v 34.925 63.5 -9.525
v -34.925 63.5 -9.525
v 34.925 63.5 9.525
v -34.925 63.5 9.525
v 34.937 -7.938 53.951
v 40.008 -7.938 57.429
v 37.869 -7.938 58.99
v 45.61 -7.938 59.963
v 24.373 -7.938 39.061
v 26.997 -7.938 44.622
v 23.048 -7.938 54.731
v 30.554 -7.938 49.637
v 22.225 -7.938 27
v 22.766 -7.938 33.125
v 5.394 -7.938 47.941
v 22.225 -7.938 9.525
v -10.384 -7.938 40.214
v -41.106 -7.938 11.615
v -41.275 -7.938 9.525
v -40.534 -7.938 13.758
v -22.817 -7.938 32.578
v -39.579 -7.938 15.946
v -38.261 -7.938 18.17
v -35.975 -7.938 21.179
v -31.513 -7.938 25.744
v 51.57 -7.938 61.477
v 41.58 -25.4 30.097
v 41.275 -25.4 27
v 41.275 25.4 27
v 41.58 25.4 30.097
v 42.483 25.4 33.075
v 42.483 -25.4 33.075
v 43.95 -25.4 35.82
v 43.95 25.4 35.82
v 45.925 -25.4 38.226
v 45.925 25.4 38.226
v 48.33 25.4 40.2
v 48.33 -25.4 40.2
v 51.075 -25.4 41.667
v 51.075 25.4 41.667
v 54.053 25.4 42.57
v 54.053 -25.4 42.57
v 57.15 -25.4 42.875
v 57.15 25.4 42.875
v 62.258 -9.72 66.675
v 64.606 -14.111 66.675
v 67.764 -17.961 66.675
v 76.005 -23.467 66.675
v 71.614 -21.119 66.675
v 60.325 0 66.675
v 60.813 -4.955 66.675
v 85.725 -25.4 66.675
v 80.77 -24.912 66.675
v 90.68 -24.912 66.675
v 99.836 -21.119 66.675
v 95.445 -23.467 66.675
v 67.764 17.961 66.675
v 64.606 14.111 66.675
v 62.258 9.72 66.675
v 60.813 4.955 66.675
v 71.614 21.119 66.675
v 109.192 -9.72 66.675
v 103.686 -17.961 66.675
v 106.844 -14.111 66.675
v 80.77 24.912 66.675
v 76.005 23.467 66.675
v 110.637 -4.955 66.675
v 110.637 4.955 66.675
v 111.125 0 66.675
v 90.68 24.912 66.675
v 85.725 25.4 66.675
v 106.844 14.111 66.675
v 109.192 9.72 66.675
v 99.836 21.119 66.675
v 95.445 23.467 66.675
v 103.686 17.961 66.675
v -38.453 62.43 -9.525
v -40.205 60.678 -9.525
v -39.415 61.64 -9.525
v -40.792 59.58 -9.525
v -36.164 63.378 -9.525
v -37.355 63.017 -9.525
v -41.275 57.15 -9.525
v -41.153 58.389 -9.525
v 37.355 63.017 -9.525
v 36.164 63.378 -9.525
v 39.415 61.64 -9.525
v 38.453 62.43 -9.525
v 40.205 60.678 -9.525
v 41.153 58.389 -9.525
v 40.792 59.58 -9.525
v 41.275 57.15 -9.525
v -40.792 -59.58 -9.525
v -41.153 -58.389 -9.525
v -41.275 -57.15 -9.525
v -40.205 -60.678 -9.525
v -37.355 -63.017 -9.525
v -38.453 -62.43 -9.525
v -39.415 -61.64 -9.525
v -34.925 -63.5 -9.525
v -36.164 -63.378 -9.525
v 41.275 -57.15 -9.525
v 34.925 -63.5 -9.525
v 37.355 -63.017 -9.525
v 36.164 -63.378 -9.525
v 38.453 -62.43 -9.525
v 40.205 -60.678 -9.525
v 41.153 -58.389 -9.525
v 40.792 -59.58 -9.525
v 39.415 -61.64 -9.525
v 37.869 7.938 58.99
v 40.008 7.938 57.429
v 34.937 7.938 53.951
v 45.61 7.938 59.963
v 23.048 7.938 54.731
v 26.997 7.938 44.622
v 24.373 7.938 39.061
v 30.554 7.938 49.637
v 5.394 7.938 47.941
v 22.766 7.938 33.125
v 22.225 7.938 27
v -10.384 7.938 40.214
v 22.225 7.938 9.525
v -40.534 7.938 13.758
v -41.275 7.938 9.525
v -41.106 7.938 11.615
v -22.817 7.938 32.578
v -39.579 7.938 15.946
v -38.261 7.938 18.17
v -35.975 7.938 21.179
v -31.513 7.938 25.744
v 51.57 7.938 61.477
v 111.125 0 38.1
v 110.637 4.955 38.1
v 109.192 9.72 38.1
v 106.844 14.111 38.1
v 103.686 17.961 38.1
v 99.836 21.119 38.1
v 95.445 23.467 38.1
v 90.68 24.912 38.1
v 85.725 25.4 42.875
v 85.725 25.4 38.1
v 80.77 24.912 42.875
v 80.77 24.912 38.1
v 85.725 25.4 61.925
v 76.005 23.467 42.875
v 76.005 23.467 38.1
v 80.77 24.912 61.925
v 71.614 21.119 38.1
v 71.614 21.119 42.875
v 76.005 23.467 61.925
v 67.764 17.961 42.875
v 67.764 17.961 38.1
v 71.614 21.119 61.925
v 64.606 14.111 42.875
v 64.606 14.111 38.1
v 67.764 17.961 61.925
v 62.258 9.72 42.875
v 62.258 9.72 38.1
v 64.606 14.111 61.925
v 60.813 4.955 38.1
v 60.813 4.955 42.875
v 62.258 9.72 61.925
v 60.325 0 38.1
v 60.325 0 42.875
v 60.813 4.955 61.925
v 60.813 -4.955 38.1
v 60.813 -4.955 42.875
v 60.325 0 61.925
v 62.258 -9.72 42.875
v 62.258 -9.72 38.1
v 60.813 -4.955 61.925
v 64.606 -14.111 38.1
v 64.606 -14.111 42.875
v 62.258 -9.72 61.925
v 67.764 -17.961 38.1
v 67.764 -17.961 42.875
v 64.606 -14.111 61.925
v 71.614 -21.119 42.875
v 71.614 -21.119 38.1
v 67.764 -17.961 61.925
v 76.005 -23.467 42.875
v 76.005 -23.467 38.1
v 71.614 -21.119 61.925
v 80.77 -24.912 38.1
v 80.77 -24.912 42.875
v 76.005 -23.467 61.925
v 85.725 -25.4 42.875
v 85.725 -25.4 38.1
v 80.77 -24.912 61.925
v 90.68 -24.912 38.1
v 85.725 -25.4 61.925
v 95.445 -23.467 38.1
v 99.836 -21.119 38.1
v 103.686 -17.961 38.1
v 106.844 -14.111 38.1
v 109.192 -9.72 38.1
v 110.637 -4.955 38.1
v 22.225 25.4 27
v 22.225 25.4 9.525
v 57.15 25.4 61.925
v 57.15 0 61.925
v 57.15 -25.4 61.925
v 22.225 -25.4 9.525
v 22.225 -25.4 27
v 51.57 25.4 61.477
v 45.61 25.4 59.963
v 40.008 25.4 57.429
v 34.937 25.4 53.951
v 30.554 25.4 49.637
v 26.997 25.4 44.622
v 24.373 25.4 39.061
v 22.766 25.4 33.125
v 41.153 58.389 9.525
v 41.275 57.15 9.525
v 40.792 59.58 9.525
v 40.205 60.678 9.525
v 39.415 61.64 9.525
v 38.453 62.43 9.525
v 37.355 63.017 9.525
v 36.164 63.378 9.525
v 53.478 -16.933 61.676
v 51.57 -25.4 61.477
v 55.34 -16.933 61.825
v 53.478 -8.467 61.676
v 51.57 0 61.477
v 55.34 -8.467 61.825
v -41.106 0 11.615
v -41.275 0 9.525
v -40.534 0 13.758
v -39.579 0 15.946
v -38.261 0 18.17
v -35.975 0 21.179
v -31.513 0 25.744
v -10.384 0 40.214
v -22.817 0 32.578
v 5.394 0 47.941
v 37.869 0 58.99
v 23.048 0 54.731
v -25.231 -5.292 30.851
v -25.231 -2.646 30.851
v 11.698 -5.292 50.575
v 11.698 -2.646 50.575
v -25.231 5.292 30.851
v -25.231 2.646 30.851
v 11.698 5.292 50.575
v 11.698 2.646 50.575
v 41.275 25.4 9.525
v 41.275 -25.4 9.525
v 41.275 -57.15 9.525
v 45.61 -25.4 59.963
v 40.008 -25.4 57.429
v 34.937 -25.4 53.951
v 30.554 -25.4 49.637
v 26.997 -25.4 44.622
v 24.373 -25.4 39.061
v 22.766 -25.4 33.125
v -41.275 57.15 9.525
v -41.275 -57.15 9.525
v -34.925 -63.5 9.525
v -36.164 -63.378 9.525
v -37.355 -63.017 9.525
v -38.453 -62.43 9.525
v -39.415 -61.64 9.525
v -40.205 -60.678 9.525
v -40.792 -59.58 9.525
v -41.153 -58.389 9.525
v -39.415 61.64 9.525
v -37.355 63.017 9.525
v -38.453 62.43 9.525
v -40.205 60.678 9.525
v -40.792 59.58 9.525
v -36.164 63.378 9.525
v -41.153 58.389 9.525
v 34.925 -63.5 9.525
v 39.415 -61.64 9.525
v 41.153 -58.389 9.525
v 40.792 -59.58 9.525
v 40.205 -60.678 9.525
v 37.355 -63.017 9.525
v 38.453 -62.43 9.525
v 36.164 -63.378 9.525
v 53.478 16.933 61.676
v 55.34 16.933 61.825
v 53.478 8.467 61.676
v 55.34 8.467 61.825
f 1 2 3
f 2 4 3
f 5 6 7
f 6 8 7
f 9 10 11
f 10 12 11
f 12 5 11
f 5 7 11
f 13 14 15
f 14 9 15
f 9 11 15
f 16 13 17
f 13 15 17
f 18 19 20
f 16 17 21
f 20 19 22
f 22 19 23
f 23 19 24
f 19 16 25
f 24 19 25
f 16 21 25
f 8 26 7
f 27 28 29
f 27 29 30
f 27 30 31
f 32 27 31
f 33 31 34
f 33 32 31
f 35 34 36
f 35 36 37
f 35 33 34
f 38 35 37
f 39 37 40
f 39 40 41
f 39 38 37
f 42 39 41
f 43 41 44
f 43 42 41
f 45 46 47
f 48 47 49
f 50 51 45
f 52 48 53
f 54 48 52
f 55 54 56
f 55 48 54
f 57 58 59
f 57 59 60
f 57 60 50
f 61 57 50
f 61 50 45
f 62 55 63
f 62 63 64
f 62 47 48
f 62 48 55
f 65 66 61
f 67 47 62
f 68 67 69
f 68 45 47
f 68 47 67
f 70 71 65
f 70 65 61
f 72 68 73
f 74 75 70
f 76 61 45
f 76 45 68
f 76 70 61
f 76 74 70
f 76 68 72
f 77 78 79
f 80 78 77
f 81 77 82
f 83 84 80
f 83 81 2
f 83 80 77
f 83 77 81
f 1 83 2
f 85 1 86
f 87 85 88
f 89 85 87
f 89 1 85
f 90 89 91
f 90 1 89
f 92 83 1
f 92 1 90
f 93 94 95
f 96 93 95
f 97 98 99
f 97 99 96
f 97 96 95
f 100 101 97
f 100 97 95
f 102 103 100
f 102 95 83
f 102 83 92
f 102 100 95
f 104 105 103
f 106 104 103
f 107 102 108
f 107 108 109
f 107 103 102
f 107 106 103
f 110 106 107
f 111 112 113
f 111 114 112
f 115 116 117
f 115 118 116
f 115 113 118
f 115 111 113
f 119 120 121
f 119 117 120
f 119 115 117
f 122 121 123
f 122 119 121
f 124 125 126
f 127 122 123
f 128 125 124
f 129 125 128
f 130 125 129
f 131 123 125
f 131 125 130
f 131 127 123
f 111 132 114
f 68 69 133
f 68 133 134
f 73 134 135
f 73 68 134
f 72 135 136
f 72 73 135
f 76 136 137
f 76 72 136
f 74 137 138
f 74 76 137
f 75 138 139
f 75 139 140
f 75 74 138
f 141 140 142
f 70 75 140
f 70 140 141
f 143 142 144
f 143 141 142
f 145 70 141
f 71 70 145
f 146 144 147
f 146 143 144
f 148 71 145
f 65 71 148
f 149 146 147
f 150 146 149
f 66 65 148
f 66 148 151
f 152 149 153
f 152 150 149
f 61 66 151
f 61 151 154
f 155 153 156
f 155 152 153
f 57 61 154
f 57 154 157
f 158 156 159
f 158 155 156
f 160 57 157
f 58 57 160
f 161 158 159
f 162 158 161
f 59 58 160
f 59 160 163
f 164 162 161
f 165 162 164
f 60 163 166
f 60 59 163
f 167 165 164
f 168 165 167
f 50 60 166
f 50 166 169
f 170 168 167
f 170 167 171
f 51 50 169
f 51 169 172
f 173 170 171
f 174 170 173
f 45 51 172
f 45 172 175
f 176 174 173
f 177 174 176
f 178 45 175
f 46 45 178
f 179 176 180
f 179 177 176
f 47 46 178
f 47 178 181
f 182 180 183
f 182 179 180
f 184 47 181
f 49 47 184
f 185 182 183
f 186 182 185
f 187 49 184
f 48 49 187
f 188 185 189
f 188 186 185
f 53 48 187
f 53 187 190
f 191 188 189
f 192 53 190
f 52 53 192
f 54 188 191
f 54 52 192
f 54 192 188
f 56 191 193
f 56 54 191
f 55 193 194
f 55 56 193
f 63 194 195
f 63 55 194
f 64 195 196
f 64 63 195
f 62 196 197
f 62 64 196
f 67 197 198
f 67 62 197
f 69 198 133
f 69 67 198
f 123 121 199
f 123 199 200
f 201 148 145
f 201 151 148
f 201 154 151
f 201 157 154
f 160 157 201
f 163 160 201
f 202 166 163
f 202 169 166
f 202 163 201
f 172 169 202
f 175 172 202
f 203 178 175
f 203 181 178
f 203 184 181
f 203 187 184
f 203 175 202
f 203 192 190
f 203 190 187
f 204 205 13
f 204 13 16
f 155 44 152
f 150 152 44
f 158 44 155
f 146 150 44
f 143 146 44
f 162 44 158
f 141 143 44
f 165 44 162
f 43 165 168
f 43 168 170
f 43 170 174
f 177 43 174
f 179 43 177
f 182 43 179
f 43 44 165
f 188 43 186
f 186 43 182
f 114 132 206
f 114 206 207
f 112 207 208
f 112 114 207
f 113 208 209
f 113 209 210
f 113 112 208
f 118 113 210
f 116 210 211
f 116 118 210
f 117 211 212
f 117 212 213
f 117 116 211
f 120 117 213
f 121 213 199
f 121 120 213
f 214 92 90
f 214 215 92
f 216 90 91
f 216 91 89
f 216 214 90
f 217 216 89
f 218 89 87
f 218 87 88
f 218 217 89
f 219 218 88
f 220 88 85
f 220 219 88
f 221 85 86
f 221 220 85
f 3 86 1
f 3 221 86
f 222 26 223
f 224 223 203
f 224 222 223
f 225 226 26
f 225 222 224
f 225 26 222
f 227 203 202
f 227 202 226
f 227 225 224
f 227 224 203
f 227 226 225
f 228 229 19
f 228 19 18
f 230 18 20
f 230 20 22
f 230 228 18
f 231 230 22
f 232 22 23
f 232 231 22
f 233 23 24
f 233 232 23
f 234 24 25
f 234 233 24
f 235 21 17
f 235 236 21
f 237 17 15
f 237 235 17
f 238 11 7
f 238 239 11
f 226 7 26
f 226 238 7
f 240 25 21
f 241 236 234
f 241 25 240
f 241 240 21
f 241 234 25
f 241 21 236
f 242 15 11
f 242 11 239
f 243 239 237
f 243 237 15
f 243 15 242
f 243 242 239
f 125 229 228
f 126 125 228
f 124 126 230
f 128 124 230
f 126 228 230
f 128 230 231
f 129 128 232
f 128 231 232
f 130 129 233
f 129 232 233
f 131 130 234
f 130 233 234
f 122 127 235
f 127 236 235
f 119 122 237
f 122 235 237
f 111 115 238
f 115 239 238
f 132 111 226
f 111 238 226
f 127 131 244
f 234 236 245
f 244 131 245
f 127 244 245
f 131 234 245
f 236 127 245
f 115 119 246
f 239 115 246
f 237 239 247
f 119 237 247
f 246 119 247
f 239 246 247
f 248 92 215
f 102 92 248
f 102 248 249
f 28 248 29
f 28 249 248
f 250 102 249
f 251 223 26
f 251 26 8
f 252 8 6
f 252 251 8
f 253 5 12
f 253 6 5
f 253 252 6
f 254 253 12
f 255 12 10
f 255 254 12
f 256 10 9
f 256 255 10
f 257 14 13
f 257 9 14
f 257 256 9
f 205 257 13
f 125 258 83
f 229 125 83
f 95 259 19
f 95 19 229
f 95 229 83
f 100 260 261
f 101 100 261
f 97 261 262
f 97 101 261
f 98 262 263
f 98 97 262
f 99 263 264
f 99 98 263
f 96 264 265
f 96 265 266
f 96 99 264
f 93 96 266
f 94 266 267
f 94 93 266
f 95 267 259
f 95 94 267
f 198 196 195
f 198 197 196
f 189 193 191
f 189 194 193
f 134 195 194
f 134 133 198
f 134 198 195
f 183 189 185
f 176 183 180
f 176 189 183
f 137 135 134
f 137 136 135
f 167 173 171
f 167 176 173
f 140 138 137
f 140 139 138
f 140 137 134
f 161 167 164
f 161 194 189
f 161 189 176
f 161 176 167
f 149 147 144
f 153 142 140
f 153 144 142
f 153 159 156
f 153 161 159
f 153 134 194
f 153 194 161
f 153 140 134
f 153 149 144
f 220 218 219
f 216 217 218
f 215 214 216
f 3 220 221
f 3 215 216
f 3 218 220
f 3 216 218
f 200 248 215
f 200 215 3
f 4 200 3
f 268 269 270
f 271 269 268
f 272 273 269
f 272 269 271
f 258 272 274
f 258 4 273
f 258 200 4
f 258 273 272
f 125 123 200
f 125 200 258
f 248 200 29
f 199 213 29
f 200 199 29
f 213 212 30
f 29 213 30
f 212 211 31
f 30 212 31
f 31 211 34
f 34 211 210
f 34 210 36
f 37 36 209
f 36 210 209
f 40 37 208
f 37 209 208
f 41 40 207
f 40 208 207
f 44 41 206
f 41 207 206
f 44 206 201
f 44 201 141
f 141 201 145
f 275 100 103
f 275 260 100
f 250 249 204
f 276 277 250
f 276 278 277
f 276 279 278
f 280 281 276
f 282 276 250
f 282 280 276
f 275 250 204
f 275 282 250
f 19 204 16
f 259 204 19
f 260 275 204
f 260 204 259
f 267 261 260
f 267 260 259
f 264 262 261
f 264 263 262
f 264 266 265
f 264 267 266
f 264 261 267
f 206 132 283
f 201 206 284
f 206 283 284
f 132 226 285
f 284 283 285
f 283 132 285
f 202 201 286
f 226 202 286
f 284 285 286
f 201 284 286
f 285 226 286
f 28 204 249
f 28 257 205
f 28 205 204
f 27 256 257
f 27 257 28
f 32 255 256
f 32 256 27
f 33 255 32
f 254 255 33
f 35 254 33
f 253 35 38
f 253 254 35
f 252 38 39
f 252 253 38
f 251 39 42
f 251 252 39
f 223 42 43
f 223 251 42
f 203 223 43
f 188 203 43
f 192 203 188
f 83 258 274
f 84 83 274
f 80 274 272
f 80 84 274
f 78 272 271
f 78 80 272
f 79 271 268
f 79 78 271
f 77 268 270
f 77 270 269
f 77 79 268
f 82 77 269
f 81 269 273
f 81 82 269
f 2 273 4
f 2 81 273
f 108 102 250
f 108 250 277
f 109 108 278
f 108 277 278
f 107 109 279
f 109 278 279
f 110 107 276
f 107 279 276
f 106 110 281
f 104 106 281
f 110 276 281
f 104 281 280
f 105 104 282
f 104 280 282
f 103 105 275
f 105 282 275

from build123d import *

# Parameters (mm, degrees)
F1_DEPTH = 63.5
F2_DEPTH = 7.9375
F0_W     = 25.4
F0_H     = 19.05
F3_DEPTH = 25.4
F5_R     = 6.35


with BuildPart() as f1:
    # F0 (on Front) → F1 (new body, symmetric)
    with BuildSketch(Plane.XZ):
        Polygon((-41.275, -9.525), (41.275, -9.525), (41.275, 9.525), (22.225, 9.525), (-41.275, 9.525), align=None)
    extrude(amount=F1_DEPTH, both=True)

    # F0 (on Front) → F2 (join, symmetric)
    with BuildSketch(Plane.XZ):
        with BuildLine():
            add(Edge.make_bspline(
                [(-41.275, 9.525), (-41.6549469466, 29.246440989), (16.2084851721, 57.3919038747), (51.5697219999, 61.4765124832)],
                knots=[0, 0, 0, 0, 105.7290350632, 105.7290350632, 105.7290350632, 105.7290350632], degree=3))
            Line((-41.275, 9.525), (22.225, 9.525))
            Line((22.225, 9.525), (22.225, 27.0002))
            ThreePointArc((22.225, 27.0002), (30.5544474192, 49.6371655193), (51.5697219999, 61.4765124832))
        make_face()
    extrude(amount=F2_DEPTH, both=True)

    # F0 (on Front) → F3 (join, symmetric)
    with BuildSketch(Plane.XZ):
        with BuildLine():
            Line((22.225, 9.525), (41.275, 9.525))
            Line((41.275, 9.525), (41.275, 27.0002))
            ThreePointArc((41.275, 27.0002), (45.9246798487, 38.2255201513), (57.15, 42.8752))
            Line((57.15, 42.8752), (60.325, 42.8752))
            Line((60.325, 42.8752), (60.325, 61.9252))
            Line((60.325, 61.9252), (57.15, 61.9252))
            add(Edge.make_bspline(
                [(51.5697219999, 61.4765124832), (53.5013471404, 61.699636259), (55.3658269691, 61.8509637705), (57.15, 61.9252)],
                knots=[105.7290350632, 105.7290350632, 105.7290350632, 105.7290350632, 111.5045361635, 111.5045361635, 111.5045361635, 111.5045361635], degree=3))
            ThreePointArc((51.5697219999, 61.4765124832), (30.5544474192, 49.6371655193), (22.225, 27.0002))
            Line((22.225, 27.0002), (22.225, 9.525))
        make_face()
        with Locations((73.025, 52.4002)):
            Rectangle(F0_W, F0_H)
    extrude(amount=F3_DEPTH, both=True)

    # F0 (on Front) → F4 (revolve)
    with BuildSketch(Plane.XZ):
        Polygon((85.725, 61.9252), (85.725, 42.8752), (85.725, 38.1), (111.125, 38.1), (111.125, 66.675), (85.725, 66.675), align=None)
    revolve(axis=Axis((85.725, 0, 52.3875), (0, 0, 1)))

    # F5
    f5_edges = [f1.edges().sort_by_distance(p)[0] for p in [
        (41.275, -63.5, 0),
        (-41.275, -63.5, 0),
        (-41.275, 63.5, 0),
        (41.275, 63.5, 0),
    ]]
    fillet(f5_edges, radius=F5_R)


solid = f1.part
